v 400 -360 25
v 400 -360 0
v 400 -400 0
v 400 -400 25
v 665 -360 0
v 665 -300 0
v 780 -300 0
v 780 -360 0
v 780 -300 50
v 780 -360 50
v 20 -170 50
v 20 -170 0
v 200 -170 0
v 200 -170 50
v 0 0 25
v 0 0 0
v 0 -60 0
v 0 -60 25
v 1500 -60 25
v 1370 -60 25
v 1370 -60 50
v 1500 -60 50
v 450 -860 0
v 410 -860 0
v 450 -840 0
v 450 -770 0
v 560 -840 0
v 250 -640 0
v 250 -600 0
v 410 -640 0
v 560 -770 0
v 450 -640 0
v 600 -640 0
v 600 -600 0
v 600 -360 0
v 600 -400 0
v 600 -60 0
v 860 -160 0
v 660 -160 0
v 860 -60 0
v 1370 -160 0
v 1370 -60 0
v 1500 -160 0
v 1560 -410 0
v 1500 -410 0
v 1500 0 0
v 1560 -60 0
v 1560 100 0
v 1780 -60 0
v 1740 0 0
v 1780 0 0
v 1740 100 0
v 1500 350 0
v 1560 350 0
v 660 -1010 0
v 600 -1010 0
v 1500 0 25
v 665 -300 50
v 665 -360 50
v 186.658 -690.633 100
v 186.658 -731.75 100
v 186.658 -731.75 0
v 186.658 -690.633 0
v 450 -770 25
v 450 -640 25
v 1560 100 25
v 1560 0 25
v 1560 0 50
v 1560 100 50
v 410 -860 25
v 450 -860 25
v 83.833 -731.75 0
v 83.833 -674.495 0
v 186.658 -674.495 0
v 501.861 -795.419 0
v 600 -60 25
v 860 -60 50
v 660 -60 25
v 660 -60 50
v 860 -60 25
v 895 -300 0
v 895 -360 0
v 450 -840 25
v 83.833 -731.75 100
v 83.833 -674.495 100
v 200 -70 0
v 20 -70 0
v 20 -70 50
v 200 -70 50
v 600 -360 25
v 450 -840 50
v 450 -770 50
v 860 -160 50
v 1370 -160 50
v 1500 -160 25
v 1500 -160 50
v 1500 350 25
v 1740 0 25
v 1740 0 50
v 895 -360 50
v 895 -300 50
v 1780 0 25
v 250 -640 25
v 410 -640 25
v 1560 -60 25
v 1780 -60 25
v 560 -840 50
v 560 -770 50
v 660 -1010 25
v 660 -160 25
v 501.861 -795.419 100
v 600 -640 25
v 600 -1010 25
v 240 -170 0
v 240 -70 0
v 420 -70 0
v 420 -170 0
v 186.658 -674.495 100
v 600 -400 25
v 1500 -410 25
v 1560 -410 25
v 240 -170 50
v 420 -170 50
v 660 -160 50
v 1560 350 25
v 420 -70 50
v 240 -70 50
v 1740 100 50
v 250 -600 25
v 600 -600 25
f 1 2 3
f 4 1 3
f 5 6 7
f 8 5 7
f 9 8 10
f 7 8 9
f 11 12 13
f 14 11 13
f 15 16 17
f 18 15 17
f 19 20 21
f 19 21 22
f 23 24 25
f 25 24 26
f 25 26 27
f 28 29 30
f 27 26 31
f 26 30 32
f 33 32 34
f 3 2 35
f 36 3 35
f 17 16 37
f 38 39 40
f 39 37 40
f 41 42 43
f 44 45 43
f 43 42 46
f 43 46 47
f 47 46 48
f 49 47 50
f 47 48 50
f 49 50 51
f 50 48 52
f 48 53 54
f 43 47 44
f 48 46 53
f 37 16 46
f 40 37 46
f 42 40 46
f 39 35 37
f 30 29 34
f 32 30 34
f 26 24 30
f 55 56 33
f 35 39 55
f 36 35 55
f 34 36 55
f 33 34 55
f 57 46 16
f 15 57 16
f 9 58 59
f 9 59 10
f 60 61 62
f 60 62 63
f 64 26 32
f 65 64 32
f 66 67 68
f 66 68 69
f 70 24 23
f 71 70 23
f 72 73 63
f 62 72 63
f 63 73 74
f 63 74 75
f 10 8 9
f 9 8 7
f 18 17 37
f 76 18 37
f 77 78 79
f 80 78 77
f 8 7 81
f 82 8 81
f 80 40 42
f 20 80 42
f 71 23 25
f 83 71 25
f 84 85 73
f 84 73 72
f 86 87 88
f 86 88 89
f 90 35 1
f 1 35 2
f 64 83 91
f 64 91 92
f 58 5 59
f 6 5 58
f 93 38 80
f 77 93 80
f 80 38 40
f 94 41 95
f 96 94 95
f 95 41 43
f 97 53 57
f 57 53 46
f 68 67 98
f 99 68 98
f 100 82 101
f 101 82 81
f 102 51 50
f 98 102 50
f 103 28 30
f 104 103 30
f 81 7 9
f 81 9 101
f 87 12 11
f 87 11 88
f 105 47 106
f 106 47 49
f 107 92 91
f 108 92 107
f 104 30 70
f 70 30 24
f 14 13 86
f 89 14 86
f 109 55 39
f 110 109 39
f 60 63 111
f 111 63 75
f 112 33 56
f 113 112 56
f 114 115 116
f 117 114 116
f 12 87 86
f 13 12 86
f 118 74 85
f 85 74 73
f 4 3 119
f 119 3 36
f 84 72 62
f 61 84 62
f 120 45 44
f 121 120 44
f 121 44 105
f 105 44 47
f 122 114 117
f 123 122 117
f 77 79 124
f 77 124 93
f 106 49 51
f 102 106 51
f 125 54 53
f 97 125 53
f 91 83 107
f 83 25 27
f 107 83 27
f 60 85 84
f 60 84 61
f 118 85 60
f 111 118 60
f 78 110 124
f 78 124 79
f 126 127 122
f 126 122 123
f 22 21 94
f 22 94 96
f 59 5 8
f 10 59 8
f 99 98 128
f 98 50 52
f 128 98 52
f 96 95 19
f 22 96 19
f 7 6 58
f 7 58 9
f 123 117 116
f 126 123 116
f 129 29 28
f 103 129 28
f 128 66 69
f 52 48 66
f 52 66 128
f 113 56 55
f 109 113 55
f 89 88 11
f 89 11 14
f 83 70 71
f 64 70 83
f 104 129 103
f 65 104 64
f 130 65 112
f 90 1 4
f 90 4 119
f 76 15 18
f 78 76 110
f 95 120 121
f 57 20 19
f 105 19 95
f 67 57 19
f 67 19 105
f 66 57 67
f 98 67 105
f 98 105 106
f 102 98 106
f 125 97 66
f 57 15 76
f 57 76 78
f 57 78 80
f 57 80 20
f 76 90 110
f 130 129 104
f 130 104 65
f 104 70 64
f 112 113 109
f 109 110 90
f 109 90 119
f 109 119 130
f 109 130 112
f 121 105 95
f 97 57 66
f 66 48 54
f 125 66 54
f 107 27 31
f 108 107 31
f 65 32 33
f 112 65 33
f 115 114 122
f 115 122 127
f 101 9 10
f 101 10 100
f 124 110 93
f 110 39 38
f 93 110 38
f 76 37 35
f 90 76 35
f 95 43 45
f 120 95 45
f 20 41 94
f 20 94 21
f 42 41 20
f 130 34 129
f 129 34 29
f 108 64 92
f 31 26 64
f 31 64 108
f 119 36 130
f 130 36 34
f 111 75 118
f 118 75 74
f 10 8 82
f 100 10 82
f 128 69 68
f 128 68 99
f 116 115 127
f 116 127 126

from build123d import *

# Parameters (mm, degrees)
F1_DEPTH = 25
F2_W     = 180
F2_H     = 100
F2_W_2   = 200
F2_W_3   = 115
F2_H_2   = 60
F2_W_4   = 130
F2_W_5   = 110
F2_H_3   = 70
F3_DEPTH = 50
F4_DEPTH = 50
F6_DEPTH = 100


with BuildPart() as f1:
    # F0 (on Top) → F1 (new body)
    with BuildSketch(Plane.XY):
        Polygon((1500, 0), (0, 0), (0, -60), (600, -60), (600, -360), (400, -360), (400, -400), (600, -400), (600, -600), (250, -600), (250, -640), (410, -640), (410, -860), (450, -860), (450, -640), (600, -640), (600, -1010), (660, -1010), (660, -60), (1500, -60), (1500, -410), (1560, -410), (1560, -60), (1780, -60), (1780, 0), (1560, 0), (1560, 350), (1500, 350), align=None)
    extrude(amount=F1_DEPTH)

    # F2 (on Top) → F3 (join)
    with BuildSketch(Plane.XY):
        with Locations((110, -120)):
            Rectangle(F2_W, F2_H)
        with Locations((330, -120)):
            Rectangle(F2_W, F2_H)
        with Locations((760, -110)):
            Rectangle(F2_W_2, F2_H)
        with Locations((722.5, -330)):
            Rectangle(F2_W_3, F2_H_2)
        with Locations((1435, -110)):
            Rectangle(F2_W_4, F2_H)
        with Locations((1650, 50)):
            Rectangle(F2_W, F2_H)
        with Locations((505, -805)):
            Rectangle(F2_W_5, F2_H_3)
    extrude(amount=F3_DEPTH)


with BuildPart() as f4:
    # F2 (on Top) → F4 (new body)
    with BuildSketch(Plane.XY):
        with Locations((837.5, -330)):
            Rectangle(F2_W_3, F2_H_2)
    extrude(amount=F4_DEPTH)


with BuildPart() as f6:
    # F5 (on Top) → F6 (new body)
    with BuildSketch(Plane.XY):
        Polygon((186.658114, -674.494982), (83.833493, -674.494982), (83.833493, -731.749654), (186.658114, -731.749654), (186.658114, -690.633244), (501.860559, -795.41868), align=None)
    extrude(amount=F6_DEPTH)


solid = Compound([f1.part, f4.part, f6.part])
